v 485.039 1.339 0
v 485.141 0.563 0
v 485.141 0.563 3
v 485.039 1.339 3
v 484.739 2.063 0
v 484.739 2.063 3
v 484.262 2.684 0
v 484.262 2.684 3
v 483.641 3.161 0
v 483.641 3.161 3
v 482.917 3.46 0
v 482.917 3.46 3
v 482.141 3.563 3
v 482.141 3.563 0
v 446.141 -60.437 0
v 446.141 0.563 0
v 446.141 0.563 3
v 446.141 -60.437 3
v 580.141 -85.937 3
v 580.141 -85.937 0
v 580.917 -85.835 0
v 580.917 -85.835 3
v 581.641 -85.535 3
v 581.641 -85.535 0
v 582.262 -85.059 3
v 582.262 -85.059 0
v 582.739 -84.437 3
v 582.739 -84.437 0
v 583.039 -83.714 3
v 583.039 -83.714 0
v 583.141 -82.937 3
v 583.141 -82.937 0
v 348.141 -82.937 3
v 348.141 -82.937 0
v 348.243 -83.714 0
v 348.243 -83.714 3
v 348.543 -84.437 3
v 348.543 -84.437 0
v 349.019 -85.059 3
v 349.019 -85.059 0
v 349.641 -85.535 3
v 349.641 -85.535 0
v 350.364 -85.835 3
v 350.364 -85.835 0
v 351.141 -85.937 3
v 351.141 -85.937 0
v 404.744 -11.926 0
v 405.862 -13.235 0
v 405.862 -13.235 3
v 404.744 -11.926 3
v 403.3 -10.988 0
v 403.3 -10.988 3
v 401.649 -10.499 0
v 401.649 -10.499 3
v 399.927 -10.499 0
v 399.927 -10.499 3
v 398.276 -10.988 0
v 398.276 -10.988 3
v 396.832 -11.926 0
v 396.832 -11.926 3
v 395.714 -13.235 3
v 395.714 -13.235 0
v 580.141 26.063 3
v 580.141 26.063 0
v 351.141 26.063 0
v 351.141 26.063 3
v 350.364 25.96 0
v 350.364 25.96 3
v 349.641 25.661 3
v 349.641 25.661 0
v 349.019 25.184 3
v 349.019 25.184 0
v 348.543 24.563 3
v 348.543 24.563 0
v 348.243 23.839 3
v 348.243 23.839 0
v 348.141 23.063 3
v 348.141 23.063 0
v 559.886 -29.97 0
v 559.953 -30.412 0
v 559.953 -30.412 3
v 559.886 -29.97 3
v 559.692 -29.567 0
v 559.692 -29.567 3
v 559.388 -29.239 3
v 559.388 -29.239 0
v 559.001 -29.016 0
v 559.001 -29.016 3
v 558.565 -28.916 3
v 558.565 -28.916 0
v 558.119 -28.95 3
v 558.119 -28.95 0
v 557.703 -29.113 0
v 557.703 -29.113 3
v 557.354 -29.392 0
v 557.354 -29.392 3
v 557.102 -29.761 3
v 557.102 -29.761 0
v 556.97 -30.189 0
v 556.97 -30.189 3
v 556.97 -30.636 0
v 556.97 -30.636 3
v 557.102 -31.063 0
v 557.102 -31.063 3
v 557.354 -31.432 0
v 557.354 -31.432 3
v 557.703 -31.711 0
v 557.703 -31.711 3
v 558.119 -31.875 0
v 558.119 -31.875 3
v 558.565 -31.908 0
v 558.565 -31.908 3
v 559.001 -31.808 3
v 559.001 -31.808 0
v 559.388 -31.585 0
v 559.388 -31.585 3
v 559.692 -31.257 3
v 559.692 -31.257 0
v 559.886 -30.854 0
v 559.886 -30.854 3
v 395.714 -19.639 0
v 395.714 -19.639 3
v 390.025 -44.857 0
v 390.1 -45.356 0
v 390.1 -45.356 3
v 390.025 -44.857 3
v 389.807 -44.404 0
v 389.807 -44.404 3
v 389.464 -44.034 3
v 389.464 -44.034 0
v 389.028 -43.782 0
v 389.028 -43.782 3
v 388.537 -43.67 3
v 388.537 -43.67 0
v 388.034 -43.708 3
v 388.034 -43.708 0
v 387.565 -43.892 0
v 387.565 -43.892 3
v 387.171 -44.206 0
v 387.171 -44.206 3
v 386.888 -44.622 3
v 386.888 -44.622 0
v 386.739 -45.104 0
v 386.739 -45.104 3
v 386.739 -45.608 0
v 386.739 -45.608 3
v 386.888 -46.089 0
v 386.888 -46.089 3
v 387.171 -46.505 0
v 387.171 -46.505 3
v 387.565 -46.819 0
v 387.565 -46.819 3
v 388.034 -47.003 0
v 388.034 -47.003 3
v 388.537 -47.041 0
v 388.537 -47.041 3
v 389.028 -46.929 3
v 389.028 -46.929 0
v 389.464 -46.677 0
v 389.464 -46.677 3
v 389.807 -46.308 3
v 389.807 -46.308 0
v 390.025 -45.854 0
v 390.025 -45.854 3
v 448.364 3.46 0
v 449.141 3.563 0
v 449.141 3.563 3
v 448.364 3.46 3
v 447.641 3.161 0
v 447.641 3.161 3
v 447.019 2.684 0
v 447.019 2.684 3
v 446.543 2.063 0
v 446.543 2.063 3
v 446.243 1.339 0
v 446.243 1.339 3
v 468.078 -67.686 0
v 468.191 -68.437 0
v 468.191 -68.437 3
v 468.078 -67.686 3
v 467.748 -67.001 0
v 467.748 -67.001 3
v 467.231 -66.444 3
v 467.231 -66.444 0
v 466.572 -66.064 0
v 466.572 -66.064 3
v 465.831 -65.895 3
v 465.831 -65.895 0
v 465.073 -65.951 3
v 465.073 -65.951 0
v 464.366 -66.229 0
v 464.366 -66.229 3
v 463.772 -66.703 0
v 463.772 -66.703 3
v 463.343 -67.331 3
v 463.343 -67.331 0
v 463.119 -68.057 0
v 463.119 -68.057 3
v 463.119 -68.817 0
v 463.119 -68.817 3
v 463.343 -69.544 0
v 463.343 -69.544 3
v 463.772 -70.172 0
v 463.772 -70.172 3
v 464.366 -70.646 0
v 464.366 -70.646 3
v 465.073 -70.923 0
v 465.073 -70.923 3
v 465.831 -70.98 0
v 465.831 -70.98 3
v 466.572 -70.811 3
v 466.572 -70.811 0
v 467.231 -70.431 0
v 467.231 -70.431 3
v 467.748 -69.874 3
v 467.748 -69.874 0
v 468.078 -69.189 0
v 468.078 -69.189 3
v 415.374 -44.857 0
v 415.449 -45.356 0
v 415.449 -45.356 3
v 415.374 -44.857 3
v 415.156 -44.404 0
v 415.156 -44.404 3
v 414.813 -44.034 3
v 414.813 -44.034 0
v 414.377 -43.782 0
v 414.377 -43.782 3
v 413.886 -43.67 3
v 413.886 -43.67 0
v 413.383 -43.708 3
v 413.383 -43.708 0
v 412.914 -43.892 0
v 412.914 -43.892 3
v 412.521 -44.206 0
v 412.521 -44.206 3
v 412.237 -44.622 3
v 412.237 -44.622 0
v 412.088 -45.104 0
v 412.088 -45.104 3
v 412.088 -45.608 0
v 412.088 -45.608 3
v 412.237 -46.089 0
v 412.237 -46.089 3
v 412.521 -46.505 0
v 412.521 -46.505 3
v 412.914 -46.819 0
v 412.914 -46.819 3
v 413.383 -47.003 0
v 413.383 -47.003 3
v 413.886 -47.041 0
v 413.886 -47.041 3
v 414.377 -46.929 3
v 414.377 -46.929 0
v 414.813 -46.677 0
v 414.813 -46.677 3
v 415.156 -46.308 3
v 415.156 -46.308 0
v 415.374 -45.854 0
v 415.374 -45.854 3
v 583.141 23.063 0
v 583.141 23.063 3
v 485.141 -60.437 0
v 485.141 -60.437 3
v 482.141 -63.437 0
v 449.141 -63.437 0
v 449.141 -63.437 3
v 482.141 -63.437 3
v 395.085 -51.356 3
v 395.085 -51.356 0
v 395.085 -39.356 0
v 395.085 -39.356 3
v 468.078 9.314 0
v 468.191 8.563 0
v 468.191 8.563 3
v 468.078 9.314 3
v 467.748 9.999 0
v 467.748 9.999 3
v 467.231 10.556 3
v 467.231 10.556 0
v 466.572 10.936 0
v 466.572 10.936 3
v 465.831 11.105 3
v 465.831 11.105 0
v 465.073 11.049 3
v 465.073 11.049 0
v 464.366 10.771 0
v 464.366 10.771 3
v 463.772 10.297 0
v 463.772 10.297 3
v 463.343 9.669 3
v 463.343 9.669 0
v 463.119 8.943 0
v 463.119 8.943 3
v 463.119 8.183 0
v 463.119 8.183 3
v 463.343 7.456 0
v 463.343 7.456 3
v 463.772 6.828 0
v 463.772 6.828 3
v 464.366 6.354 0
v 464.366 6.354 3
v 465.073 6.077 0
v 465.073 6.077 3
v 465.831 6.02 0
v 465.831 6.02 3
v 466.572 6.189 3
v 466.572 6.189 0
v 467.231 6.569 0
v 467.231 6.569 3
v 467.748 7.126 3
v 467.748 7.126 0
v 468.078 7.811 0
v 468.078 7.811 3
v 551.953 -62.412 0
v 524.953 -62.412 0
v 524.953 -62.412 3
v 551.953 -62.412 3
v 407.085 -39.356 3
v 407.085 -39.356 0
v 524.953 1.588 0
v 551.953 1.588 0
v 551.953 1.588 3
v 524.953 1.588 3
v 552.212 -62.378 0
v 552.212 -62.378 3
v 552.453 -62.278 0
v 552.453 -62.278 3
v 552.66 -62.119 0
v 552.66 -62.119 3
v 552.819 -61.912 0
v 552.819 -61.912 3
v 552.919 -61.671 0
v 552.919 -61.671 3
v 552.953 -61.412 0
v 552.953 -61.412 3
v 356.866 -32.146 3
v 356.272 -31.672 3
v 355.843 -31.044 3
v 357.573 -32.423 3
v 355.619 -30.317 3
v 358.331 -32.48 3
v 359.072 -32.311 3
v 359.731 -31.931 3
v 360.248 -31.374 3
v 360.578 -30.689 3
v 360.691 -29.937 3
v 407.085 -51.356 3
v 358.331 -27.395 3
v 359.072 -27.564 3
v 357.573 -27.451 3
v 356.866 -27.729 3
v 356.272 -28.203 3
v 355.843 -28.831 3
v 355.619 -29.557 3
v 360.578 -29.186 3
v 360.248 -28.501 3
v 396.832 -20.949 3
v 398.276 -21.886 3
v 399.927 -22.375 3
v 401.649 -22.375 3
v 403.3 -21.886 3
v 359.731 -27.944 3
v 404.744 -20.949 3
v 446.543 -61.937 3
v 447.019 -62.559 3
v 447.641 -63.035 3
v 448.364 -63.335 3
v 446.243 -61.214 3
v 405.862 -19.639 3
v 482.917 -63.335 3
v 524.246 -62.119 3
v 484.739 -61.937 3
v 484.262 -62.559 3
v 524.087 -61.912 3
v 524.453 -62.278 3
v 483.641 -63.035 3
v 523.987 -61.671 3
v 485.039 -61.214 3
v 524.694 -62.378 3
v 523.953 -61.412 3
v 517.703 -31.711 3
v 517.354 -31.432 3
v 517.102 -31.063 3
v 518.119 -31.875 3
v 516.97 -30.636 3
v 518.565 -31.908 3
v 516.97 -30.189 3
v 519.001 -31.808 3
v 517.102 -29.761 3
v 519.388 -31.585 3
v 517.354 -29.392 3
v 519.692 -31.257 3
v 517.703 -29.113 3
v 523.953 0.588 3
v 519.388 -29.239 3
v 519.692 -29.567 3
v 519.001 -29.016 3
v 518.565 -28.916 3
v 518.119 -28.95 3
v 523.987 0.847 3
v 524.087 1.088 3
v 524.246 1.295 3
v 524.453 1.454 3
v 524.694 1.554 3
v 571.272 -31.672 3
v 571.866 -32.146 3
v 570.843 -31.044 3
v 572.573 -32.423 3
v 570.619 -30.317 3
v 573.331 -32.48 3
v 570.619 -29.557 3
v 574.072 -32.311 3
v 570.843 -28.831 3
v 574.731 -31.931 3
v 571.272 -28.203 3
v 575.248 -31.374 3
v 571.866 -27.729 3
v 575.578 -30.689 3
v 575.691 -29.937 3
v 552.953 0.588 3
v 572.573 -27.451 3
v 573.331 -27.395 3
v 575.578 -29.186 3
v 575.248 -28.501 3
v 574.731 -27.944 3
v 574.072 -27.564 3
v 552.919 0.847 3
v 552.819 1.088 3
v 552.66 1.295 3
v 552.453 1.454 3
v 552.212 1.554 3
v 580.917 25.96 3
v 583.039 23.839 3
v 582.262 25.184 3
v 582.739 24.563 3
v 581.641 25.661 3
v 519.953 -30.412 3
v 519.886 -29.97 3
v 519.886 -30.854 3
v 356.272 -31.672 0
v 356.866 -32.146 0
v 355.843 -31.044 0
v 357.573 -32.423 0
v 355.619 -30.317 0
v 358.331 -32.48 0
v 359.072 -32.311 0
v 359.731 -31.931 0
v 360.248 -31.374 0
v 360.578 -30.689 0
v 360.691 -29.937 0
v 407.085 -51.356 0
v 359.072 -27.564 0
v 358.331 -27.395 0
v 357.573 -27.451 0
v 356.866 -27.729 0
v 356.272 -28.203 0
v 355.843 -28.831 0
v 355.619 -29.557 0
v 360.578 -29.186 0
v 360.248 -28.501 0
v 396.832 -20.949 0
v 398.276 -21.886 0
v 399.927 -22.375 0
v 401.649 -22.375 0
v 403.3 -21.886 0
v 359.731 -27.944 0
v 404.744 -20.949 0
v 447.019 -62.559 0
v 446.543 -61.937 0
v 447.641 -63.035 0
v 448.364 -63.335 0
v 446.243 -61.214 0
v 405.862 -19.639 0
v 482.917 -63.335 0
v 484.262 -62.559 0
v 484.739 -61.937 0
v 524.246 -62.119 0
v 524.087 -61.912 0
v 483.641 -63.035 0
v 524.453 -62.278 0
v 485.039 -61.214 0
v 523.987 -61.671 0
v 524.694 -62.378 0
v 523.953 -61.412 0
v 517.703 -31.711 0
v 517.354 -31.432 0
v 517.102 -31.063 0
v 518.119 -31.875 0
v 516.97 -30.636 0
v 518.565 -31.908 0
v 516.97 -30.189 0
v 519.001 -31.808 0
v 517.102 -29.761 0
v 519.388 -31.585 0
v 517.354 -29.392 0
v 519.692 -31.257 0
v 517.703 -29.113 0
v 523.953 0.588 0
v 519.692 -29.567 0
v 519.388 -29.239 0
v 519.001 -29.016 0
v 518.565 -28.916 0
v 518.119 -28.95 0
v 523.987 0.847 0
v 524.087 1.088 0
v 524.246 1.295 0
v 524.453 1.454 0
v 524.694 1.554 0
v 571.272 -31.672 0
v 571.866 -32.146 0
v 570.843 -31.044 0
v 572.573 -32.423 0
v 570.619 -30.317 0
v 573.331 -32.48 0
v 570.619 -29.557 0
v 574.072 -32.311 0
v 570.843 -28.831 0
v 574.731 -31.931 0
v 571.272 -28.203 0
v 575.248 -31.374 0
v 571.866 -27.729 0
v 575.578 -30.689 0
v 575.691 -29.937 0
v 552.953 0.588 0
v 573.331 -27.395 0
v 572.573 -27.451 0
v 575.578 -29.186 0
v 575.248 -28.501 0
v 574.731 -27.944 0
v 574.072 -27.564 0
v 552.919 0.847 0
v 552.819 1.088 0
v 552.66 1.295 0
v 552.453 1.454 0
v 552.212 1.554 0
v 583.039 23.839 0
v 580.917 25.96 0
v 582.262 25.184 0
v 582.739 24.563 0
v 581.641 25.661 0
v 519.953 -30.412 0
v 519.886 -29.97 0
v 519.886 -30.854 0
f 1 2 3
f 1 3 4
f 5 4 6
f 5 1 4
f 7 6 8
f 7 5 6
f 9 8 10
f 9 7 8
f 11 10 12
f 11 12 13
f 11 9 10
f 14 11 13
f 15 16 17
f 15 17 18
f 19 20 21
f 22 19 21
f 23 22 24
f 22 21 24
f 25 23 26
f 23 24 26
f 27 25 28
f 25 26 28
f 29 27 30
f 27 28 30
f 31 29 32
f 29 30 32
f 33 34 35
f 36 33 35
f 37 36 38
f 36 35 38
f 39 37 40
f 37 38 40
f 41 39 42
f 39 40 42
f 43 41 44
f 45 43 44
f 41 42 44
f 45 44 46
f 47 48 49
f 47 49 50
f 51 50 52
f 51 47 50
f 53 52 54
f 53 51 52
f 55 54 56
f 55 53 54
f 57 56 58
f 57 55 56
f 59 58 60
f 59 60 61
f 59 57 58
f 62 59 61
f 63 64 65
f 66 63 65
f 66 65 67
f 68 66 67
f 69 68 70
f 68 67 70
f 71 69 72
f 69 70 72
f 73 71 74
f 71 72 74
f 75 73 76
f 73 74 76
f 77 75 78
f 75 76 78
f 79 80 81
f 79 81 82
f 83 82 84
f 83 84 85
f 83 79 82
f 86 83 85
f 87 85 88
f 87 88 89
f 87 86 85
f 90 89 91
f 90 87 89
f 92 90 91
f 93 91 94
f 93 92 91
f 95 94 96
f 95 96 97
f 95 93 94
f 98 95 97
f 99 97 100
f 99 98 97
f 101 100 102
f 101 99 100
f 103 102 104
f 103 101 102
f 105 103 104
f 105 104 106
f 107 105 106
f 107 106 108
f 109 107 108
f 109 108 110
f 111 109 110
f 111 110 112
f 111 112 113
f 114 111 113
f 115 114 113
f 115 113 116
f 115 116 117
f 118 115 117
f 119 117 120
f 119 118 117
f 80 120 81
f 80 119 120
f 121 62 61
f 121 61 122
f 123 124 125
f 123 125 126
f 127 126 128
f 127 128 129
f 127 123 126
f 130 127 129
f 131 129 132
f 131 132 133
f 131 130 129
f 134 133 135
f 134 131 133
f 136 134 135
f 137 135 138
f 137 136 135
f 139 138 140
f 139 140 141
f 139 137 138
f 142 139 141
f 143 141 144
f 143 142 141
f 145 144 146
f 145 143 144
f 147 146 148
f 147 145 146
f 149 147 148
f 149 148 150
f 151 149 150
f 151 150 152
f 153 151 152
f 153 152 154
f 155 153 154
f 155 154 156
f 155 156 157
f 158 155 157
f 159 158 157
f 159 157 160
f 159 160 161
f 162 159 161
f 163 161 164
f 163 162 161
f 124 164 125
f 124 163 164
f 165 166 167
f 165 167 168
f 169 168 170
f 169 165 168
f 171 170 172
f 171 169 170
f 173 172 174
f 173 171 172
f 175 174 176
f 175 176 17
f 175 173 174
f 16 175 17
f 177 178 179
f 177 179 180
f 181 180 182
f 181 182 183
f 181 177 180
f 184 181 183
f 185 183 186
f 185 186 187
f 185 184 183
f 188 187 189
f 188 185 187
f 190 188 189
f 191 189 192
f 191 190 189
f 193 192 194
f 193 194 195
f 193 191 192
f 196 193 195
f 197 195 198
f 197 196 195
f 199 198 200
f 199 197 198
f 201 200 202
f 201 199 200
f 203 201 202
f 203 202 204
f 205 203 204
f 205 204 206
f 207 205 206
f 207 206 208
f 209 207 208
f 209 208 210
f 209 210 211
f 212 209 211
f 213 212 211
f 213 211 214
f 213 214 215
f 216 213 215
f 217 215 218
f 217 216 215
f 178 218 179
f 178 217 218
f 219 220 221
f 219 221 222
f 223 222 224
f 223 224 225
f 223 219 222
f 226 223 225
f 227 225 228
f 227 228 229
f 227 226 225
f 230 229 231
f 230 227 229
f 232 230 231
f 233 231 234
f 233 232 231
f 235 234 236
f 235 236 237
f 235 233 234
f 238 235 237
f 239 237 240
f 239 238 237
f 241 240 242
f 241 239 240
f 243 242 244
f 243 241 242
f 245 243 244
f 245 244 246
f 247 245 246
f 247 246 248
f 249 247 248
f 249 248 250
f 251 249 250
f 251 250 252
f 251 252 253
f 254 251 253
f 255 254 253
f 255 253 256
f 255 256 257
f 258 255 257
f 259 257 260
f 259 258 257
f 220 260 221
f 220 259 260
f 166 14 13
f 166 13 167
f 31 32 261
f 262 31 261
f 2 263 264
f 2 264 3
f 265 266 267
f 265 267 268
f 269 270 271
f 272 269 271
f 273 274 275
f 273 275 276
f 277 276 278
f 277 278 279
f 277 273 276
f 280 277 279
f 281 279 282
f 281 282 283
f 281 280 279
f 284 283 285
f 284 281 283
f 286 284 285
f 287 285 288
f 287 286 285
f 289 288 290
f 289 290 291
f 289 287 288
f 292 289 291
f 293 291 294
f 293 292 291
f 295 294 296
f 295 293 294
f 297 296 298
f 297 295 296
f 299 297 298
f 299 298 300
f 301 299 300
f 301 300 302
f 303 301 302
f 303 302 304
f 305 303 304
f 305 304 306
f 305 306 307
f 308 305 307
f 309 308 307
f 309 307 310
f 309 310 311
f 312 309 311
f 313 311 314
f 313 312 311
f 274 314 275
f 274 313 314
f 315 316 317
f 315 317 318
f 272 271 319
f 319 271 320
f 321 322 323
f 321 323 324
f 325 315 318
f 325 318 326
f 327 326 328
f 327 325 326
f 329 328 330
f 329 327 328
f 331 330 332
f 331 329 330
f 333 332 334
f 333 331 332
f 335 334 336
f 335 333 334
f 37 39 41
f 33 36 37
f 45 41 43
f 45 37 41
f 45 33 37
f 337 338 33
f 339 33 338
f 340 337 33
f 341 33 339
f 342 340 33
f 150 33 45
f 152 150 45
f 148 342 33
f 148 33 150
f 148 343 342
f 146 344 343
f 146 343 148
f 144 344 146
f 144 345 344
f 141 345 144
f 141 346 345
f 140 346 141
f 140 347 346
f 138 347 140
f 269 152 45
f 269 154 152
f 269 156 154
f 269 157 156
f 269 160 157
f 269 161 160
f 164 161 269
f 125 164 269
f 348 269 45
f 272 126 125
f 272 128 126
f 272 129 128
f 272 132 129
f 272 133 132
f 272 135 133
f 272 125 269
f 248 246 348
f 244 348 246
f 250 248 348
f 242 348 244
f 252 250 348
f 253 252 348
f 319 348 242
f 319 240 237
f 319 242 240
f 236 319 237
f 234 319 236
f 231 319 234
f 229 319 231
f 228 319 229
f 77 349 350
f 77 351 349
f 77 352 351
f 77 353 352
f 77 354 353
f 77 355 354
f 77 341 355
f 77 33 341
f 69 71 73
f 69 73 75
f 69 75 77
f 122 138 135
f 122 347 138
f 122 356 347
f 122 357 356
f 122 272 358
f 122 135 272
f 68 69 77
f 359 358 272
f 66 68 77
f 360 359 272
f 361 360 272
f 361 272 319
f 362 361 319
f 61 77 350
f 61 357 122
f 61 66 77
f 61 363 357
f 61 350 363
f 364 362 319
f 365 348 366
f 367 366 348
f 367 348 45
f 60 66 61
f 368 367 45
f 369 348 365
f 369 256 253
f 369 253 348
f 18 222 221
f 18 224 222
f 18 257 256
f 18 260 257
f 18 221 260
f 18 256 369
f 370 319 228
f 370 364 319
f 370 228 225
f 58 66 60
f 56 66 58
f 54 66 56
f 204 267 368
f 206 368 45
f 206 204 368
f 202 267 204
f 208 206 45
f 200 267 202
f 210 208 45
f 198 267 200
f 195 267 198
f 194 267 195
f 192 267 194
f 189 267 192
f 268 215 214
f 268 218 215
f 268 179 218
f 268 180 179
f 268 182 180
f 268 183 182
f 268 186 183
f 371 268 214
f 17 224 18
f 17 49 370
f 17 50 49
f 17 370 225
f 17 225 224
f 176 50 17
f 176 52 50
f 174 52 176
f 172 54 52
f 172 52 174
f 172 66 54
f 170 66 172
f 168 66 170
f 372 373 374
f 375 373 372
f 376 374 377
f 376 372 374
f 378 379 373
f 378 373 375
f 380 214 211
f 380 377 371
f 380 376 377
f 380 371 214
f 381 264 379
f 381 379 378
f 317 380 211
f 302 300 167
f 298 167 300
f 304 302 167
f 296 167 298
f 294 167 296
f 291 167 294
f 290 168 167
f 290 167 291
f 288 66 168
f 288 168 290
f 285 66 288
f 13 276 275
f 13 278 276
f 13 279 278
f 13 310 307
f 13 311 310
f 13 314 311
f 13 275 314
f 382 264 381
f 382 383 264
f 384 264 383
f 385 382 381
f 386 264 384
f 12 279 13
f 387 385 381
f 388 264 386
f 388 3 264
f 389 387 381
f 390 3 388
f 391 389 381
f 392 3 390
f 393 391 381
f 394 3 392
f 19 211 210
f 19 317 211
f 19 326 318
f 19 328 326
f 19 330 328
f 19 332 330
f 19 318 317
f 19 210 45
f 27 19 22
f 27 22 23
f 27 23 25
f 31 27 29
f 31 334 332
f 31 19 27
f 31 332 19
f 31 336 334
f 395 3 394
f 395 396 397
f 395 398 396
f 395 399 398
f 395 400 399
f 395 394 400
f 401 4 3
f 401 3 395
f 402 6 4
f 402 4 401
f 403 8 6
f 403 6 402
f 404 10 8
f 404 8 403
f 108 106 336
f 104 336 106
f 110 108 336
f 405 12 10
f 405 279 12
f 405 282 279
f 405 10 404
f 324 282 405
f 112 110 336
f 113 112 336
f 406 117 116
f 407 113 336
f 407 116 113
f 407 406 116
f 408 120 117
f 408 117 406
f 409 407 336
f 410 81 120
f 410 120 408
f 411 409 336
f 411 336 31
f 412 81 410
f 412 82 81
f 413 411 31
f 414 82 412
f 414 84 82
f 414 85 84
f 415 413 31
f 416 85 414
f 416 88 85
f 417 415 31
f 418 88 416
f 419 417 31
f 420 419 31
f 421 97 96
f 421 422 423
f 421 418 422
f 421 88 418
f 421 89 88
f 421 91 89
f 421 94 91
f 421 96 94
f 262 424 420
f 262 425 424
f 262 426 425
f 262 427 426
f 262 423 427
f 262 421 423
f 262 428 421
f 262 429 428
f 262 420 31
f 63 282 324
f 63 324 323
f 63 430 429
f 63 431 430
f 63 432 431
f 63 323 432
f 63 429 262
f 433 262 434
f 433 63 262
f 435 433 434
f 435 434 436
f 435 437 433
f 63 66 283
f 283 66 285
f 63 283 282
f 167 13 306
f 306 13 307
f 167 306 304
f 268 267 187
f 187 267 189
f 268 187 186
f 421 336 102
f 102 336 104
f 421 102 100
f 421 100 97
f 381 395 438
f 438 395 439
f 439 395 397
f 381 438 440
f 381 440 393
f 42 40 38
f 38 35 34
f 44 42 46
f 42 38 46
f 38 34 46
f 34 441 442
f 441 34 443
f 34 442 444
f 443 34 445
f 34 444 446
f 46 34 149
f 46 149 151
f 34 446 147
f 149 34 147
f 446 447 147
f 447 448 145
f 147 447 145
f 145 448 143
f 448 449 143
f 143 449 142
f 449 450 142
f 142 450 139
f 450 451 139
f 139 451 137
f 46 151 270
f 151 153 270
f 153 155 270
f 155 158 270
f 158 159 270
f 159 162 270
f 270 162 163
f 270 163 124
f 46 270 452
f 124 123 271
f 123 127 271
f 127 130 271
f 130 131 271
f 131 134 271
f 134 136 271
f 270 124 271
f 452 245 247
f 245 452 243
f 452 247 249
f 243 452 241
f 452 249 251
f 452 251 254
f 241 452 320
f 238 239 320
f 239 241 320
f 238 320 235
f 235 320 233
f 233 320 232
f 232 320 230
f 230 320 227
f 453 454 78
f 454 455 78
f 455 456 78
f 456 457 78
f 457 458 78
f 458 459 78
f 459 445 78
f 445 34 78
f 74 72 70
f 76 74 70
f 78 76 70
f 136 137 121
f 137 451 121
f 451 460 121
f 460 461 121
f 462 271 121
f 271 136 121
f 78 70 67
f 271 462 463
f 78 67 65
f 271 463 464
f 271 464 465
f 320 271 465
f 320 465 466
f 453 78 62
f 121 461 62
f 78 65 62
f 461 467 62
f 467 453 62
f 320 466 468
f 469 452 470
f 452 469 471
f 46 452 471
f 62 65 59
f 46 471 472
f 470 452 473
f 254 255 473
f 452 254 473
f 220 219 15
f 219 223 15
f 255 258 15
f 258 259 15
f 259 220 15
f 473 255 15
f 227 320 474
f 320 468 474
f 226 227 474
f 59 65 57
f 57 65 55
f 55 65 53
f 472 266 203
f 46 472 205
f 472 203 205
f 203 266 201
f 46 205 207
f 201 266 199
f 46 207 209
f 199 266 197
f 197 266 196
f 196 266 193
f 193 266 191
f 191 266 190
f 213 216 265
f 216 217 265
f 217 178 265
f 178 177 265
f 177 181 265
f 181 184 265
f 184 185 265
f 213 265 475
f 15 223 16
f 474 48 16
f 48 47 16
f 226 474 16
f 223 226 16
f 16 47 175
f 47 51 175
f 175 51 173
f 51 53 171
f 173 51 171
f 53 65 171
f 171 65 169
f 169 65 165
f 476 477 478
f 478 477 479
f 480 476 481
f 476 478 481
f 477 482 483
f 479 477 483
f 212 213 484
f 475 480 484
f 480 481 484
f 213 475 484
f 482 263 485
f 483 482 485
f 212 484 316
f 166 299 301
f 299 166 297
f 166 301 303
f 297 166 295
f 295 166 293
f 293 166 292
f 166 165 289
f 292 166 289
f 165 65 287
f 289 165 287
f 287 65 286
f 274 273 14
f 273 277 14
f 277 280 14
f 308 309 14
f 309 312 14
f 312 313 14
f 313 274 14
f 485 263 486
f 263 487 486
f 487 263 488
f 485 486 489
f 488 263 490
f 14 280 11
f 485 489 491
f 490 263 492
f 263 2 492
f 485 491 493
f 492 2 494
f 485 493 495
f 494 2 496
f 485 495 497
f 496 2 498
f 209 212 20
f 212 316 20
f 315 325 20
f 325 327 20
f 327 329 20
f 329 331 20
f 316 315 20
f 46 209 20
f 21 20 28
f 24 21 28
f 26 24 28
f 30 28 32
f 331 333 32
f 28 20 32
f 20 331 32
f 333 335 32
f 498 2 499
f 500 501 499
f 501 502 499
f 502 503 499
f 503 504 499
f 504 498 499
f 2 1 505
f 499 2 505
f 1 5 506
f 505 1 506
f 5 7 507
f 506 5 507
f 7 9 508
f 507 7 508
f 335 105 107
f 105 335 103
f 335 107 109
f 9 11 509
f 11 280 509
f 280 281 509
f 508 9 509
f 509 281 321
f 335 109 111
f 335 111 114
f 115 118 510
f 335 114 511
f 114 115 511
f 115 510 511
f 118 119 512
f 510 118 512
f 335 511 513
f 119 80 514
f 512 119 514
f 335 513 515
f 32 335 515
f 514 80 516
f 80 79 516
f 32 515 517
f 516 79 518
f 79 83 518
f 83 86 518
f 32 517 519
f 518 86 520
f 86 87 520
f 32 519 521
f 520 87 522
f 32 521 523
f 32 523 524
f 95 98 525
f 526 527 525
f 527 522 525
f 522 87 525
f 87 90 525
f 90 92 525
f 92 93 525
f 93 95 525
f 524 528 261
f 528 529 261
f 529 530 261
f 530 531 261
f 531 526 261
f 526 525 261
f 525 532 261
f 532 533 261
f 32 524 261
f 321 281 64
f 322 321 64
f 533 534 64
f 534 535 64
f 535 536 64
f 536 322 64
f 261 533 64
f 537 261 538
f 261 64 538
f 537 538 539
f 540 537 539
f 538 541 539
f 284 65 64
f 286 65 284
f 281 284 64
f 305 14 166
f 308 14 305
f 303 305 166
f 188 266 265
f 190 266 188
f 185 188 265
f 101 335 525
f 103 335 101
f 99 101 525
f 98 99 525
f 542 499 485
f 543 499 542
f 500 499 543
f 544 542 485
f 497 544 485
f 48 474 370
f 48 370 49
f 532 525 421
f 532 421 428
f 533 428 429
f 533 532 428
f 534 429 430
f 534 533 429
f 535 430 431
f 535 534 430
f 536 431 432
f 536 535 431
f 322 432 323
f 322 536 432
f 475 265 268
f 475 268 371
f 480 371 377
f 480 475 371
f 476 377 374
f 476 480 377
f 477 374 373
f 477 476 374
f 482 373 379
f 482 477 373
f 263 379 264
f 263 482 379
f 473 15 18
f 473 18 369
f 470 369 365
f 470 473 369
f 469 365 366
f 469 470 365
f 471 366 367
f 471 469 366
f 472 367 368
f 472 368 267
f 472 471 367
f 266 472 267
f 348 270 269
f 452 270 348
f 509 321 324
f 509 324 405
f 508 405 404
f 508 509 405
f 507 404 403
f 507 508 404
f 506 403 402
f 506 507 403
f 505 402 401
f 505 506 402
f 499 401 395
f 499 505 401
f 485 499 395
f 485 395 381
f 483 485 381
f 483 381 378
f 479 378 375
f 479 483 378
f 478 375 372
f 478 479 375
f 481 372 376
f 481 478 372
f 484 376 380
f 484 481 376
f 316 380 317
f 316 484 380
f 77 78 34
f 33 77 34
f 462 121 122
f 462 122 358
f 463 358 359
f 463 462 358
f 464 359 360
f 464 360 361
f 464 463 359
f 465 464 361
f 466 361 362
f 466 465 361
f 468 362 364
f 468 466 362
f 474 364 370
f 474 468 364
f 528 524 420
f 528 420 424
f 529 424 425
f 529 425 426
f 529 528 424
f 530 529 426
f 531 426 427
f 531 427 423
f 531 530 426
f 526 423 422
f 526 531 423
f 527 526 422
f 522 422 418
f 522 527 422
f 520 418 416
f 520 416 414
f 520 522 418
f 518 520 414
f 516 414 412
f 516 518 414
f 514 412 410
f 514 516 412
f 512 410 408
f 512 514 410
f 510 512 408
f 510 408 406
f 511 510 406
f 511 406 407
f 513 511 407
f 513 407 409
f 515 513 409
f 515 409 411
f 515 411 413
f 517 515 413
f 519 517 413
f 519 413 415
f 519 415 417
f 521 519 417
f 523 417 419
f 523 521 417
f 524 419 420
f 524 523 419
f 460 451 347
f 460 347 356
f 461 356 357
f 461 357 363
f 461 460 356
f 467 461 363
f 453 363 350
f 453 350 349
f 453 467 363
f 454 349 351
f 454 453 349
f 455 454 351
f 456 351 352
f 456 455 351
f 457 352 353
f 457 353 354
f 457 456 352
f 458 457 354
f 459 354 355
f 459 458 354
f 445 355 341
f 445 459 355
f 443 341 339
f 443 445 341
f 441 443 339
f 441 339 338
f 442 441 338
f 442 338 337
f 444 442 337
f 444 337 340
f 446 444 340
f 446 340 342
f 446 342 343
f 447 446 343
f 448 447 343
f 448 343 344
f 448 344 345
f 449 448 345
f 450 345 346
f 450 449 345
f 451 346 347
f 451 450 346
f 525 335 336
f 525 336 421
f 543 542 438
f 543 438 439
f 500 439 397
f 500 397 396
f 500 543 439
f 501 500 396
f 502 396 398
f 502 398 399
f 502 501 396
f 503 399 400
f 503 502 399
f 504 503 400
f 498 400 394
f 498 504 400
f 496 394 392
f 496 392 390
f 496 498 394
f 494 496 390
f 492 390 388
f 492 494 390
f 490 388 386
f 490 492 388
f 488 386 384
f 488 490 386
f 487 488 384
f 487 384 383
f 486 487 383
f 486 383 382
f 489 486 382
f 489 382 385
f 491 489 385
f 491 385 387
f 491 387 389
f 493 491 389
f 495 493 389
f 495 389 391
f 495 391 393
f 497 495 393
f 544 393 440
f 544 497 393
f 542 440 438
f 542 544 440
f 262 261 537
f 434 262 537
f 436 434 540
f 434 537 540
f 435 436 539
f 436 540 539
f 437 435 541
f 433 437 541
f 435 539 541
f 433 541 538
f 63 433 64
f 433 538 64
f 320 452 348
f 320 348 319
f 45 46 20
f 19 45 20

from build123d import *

# Parameters (mm, degrees)
SKETCH1_R           = 2.55
SKETCH1_R_2         = 1.69
SKETCH1_R_3         = 1.5
SKETCH1_W           = 12
SKETCH1_H           = 12
BOSS_EXTRUDE1_DEPTH = 3


with BuildPart() as part:
    # Sketch1 → Boss-Extrude1 (new body)
    with BuildSketch(Plane.XY):
        with BuildLine():
            Line((580.140809409, 26.062600666), (351.140809409, 26.062600666))
            ThreePointArc((351.140809409, 26.062600666), (349.019489066, 25.18392101), (348.140809409, 23.062600666))
            Line((348.140809409, 23.062600666), (348.140809409, -82.937399334))
            ThreePointArc((348.140809409, -82.937399334), (349.019489066, -85.058719677), (351.140809409, -85.937399334))
            Line((351.140809409, -85.937399334), (580.140809409, -85.937399334))
            ThreePointArc((580.140809409, -85.937399334), (582.262129753, -85.058719677), (583.140809409, -82.937399334))
            Line((583.140809409, -82.937399334), (583.140809409, 23.062600666))
            ThreePointArc((583.140809409, 23.062600666), (582.262129753, 25.18392101), (580.140809409, 26.062600666))
        make_face()
        with Locations((465.640809409, 8.562600666)):
            Circle(SKETCH1_R, mode=Mode.SUBTRACT)
        with Locations((465.640809409, -68.437399334)):
            Circle(SKETCH1_R, mode=Mode.SUBTRACT)
        with Locations((388.410230248, -45.355631642)):
            Circle(SKETCH1_R_2, mode=Mode.SUBTRACT)
        with Locations((413.759430248, -45.355631642)):
            Circle(SKETCH1_R_2, mode=Mode.SUBTRACT)
        with Locations((518.453126584, -30.412177954)):
            Circle(SKETCH1_R_3, mode=Mode.SUBTRACT)
        with Locations((558.453126584, -30.412177954)):
            Circle(SKETCH1_R_3, mode=Mode.SUBTRACT)
        with Locations((573.140809409, -29.937399334)):
            Circle(SKETCH1_R, mode=Mode.SUBTRACT)
        with Locations((358.140809409, -29.937399334)):
            Circle(SKETCH1_R, mode=Mode.SUBTRACT)
        with BuildLine():
            Line((405.862321678, -19.639380196), (405.862321678, -13.235418472))
            ThreePointArc((405.862321678, -13.235418472), (400.788140112, -10.437399334), (395.713958547, -13.235418472))
            Line((395.713958547, -13.235418472), (395.713958547, -19.639380196))
            ThreePointArc((395.713958547, -19.639380196), (400.788140112, -22.437399334), (405.862321678, -19.639380196))
        make_face(mode=Mode.SUBTRACT)
        with BuildLine():
            Line((482.140809409, 3.562600666), (449.140809409, 3.562600666))
            ThreePointArc((449.140809409, 3.562600666), (447.019489066, 2.68392101), (446.140809409, 0.562600666))
            Line((446.140809409, 0.562600666), (446.140809409, -60.437399334))
            ThreePointArc((446.140809409, -60.437399334), (447.019489066, -62.558719677), (449.140809409, -63.437399334))
            Line((449.140809409, -63.437399334), (482.140809409, -63.437399334))
            ThreePointArc((482.140809409, -63.437399334), (484.262129753, -62.558719677), (485.140809409, -60.437399334))
            Line((485.140809409, -60.437399334), (485.140809409, 0.562600666))
            ThreePointArc((485.140809409, 0.562600666), (484.262129753, 2.68392101), (482.140809409, 3.562600666))
        make_face(mode=Mode.SUBTRACT)
        with Locations((401.084830248, -45.355631642)):
            Rectangle(SKETCH1_W, SKETCH1_H, mode=Mode.SUBTRACT)
        with BuildLine():
            Line((551.953126584, 1.587822046), (524.953126584, 1.587822046))
            ThreePointArc((524.953126584, 1.587822046), (524.246019803, 1.294928827), (523.953126584, 0.587822046))
            Line((523.953126584, 0.587822046), (523.953126584, -61.412177954))
            ThreePointArc((523.953126584, -61.412177954), (524.246019803, -62.119284735), (524.953126584, -62.412177954))
            Line((524.953126584, -62.412177954), (551.953126584, -62.412177954))
            ThreePointArc((551.953126584, -62.412177954), (552.660233365, -62.119284735), (552.953126584, -61.412177954))
            Line((552.953126584, -61.412177954), (552.953126584, 0.587822046))
            ThreePointArc((552.953126584, 0.587822046), (552.660233365, 1.294928827), (551.953126584, 1.587822046))
        make_face(mode=Mode.SUBTRACT)
    extrude(amount=BOSS_EXTRUDE1_DEPTH)


solid = part.part
